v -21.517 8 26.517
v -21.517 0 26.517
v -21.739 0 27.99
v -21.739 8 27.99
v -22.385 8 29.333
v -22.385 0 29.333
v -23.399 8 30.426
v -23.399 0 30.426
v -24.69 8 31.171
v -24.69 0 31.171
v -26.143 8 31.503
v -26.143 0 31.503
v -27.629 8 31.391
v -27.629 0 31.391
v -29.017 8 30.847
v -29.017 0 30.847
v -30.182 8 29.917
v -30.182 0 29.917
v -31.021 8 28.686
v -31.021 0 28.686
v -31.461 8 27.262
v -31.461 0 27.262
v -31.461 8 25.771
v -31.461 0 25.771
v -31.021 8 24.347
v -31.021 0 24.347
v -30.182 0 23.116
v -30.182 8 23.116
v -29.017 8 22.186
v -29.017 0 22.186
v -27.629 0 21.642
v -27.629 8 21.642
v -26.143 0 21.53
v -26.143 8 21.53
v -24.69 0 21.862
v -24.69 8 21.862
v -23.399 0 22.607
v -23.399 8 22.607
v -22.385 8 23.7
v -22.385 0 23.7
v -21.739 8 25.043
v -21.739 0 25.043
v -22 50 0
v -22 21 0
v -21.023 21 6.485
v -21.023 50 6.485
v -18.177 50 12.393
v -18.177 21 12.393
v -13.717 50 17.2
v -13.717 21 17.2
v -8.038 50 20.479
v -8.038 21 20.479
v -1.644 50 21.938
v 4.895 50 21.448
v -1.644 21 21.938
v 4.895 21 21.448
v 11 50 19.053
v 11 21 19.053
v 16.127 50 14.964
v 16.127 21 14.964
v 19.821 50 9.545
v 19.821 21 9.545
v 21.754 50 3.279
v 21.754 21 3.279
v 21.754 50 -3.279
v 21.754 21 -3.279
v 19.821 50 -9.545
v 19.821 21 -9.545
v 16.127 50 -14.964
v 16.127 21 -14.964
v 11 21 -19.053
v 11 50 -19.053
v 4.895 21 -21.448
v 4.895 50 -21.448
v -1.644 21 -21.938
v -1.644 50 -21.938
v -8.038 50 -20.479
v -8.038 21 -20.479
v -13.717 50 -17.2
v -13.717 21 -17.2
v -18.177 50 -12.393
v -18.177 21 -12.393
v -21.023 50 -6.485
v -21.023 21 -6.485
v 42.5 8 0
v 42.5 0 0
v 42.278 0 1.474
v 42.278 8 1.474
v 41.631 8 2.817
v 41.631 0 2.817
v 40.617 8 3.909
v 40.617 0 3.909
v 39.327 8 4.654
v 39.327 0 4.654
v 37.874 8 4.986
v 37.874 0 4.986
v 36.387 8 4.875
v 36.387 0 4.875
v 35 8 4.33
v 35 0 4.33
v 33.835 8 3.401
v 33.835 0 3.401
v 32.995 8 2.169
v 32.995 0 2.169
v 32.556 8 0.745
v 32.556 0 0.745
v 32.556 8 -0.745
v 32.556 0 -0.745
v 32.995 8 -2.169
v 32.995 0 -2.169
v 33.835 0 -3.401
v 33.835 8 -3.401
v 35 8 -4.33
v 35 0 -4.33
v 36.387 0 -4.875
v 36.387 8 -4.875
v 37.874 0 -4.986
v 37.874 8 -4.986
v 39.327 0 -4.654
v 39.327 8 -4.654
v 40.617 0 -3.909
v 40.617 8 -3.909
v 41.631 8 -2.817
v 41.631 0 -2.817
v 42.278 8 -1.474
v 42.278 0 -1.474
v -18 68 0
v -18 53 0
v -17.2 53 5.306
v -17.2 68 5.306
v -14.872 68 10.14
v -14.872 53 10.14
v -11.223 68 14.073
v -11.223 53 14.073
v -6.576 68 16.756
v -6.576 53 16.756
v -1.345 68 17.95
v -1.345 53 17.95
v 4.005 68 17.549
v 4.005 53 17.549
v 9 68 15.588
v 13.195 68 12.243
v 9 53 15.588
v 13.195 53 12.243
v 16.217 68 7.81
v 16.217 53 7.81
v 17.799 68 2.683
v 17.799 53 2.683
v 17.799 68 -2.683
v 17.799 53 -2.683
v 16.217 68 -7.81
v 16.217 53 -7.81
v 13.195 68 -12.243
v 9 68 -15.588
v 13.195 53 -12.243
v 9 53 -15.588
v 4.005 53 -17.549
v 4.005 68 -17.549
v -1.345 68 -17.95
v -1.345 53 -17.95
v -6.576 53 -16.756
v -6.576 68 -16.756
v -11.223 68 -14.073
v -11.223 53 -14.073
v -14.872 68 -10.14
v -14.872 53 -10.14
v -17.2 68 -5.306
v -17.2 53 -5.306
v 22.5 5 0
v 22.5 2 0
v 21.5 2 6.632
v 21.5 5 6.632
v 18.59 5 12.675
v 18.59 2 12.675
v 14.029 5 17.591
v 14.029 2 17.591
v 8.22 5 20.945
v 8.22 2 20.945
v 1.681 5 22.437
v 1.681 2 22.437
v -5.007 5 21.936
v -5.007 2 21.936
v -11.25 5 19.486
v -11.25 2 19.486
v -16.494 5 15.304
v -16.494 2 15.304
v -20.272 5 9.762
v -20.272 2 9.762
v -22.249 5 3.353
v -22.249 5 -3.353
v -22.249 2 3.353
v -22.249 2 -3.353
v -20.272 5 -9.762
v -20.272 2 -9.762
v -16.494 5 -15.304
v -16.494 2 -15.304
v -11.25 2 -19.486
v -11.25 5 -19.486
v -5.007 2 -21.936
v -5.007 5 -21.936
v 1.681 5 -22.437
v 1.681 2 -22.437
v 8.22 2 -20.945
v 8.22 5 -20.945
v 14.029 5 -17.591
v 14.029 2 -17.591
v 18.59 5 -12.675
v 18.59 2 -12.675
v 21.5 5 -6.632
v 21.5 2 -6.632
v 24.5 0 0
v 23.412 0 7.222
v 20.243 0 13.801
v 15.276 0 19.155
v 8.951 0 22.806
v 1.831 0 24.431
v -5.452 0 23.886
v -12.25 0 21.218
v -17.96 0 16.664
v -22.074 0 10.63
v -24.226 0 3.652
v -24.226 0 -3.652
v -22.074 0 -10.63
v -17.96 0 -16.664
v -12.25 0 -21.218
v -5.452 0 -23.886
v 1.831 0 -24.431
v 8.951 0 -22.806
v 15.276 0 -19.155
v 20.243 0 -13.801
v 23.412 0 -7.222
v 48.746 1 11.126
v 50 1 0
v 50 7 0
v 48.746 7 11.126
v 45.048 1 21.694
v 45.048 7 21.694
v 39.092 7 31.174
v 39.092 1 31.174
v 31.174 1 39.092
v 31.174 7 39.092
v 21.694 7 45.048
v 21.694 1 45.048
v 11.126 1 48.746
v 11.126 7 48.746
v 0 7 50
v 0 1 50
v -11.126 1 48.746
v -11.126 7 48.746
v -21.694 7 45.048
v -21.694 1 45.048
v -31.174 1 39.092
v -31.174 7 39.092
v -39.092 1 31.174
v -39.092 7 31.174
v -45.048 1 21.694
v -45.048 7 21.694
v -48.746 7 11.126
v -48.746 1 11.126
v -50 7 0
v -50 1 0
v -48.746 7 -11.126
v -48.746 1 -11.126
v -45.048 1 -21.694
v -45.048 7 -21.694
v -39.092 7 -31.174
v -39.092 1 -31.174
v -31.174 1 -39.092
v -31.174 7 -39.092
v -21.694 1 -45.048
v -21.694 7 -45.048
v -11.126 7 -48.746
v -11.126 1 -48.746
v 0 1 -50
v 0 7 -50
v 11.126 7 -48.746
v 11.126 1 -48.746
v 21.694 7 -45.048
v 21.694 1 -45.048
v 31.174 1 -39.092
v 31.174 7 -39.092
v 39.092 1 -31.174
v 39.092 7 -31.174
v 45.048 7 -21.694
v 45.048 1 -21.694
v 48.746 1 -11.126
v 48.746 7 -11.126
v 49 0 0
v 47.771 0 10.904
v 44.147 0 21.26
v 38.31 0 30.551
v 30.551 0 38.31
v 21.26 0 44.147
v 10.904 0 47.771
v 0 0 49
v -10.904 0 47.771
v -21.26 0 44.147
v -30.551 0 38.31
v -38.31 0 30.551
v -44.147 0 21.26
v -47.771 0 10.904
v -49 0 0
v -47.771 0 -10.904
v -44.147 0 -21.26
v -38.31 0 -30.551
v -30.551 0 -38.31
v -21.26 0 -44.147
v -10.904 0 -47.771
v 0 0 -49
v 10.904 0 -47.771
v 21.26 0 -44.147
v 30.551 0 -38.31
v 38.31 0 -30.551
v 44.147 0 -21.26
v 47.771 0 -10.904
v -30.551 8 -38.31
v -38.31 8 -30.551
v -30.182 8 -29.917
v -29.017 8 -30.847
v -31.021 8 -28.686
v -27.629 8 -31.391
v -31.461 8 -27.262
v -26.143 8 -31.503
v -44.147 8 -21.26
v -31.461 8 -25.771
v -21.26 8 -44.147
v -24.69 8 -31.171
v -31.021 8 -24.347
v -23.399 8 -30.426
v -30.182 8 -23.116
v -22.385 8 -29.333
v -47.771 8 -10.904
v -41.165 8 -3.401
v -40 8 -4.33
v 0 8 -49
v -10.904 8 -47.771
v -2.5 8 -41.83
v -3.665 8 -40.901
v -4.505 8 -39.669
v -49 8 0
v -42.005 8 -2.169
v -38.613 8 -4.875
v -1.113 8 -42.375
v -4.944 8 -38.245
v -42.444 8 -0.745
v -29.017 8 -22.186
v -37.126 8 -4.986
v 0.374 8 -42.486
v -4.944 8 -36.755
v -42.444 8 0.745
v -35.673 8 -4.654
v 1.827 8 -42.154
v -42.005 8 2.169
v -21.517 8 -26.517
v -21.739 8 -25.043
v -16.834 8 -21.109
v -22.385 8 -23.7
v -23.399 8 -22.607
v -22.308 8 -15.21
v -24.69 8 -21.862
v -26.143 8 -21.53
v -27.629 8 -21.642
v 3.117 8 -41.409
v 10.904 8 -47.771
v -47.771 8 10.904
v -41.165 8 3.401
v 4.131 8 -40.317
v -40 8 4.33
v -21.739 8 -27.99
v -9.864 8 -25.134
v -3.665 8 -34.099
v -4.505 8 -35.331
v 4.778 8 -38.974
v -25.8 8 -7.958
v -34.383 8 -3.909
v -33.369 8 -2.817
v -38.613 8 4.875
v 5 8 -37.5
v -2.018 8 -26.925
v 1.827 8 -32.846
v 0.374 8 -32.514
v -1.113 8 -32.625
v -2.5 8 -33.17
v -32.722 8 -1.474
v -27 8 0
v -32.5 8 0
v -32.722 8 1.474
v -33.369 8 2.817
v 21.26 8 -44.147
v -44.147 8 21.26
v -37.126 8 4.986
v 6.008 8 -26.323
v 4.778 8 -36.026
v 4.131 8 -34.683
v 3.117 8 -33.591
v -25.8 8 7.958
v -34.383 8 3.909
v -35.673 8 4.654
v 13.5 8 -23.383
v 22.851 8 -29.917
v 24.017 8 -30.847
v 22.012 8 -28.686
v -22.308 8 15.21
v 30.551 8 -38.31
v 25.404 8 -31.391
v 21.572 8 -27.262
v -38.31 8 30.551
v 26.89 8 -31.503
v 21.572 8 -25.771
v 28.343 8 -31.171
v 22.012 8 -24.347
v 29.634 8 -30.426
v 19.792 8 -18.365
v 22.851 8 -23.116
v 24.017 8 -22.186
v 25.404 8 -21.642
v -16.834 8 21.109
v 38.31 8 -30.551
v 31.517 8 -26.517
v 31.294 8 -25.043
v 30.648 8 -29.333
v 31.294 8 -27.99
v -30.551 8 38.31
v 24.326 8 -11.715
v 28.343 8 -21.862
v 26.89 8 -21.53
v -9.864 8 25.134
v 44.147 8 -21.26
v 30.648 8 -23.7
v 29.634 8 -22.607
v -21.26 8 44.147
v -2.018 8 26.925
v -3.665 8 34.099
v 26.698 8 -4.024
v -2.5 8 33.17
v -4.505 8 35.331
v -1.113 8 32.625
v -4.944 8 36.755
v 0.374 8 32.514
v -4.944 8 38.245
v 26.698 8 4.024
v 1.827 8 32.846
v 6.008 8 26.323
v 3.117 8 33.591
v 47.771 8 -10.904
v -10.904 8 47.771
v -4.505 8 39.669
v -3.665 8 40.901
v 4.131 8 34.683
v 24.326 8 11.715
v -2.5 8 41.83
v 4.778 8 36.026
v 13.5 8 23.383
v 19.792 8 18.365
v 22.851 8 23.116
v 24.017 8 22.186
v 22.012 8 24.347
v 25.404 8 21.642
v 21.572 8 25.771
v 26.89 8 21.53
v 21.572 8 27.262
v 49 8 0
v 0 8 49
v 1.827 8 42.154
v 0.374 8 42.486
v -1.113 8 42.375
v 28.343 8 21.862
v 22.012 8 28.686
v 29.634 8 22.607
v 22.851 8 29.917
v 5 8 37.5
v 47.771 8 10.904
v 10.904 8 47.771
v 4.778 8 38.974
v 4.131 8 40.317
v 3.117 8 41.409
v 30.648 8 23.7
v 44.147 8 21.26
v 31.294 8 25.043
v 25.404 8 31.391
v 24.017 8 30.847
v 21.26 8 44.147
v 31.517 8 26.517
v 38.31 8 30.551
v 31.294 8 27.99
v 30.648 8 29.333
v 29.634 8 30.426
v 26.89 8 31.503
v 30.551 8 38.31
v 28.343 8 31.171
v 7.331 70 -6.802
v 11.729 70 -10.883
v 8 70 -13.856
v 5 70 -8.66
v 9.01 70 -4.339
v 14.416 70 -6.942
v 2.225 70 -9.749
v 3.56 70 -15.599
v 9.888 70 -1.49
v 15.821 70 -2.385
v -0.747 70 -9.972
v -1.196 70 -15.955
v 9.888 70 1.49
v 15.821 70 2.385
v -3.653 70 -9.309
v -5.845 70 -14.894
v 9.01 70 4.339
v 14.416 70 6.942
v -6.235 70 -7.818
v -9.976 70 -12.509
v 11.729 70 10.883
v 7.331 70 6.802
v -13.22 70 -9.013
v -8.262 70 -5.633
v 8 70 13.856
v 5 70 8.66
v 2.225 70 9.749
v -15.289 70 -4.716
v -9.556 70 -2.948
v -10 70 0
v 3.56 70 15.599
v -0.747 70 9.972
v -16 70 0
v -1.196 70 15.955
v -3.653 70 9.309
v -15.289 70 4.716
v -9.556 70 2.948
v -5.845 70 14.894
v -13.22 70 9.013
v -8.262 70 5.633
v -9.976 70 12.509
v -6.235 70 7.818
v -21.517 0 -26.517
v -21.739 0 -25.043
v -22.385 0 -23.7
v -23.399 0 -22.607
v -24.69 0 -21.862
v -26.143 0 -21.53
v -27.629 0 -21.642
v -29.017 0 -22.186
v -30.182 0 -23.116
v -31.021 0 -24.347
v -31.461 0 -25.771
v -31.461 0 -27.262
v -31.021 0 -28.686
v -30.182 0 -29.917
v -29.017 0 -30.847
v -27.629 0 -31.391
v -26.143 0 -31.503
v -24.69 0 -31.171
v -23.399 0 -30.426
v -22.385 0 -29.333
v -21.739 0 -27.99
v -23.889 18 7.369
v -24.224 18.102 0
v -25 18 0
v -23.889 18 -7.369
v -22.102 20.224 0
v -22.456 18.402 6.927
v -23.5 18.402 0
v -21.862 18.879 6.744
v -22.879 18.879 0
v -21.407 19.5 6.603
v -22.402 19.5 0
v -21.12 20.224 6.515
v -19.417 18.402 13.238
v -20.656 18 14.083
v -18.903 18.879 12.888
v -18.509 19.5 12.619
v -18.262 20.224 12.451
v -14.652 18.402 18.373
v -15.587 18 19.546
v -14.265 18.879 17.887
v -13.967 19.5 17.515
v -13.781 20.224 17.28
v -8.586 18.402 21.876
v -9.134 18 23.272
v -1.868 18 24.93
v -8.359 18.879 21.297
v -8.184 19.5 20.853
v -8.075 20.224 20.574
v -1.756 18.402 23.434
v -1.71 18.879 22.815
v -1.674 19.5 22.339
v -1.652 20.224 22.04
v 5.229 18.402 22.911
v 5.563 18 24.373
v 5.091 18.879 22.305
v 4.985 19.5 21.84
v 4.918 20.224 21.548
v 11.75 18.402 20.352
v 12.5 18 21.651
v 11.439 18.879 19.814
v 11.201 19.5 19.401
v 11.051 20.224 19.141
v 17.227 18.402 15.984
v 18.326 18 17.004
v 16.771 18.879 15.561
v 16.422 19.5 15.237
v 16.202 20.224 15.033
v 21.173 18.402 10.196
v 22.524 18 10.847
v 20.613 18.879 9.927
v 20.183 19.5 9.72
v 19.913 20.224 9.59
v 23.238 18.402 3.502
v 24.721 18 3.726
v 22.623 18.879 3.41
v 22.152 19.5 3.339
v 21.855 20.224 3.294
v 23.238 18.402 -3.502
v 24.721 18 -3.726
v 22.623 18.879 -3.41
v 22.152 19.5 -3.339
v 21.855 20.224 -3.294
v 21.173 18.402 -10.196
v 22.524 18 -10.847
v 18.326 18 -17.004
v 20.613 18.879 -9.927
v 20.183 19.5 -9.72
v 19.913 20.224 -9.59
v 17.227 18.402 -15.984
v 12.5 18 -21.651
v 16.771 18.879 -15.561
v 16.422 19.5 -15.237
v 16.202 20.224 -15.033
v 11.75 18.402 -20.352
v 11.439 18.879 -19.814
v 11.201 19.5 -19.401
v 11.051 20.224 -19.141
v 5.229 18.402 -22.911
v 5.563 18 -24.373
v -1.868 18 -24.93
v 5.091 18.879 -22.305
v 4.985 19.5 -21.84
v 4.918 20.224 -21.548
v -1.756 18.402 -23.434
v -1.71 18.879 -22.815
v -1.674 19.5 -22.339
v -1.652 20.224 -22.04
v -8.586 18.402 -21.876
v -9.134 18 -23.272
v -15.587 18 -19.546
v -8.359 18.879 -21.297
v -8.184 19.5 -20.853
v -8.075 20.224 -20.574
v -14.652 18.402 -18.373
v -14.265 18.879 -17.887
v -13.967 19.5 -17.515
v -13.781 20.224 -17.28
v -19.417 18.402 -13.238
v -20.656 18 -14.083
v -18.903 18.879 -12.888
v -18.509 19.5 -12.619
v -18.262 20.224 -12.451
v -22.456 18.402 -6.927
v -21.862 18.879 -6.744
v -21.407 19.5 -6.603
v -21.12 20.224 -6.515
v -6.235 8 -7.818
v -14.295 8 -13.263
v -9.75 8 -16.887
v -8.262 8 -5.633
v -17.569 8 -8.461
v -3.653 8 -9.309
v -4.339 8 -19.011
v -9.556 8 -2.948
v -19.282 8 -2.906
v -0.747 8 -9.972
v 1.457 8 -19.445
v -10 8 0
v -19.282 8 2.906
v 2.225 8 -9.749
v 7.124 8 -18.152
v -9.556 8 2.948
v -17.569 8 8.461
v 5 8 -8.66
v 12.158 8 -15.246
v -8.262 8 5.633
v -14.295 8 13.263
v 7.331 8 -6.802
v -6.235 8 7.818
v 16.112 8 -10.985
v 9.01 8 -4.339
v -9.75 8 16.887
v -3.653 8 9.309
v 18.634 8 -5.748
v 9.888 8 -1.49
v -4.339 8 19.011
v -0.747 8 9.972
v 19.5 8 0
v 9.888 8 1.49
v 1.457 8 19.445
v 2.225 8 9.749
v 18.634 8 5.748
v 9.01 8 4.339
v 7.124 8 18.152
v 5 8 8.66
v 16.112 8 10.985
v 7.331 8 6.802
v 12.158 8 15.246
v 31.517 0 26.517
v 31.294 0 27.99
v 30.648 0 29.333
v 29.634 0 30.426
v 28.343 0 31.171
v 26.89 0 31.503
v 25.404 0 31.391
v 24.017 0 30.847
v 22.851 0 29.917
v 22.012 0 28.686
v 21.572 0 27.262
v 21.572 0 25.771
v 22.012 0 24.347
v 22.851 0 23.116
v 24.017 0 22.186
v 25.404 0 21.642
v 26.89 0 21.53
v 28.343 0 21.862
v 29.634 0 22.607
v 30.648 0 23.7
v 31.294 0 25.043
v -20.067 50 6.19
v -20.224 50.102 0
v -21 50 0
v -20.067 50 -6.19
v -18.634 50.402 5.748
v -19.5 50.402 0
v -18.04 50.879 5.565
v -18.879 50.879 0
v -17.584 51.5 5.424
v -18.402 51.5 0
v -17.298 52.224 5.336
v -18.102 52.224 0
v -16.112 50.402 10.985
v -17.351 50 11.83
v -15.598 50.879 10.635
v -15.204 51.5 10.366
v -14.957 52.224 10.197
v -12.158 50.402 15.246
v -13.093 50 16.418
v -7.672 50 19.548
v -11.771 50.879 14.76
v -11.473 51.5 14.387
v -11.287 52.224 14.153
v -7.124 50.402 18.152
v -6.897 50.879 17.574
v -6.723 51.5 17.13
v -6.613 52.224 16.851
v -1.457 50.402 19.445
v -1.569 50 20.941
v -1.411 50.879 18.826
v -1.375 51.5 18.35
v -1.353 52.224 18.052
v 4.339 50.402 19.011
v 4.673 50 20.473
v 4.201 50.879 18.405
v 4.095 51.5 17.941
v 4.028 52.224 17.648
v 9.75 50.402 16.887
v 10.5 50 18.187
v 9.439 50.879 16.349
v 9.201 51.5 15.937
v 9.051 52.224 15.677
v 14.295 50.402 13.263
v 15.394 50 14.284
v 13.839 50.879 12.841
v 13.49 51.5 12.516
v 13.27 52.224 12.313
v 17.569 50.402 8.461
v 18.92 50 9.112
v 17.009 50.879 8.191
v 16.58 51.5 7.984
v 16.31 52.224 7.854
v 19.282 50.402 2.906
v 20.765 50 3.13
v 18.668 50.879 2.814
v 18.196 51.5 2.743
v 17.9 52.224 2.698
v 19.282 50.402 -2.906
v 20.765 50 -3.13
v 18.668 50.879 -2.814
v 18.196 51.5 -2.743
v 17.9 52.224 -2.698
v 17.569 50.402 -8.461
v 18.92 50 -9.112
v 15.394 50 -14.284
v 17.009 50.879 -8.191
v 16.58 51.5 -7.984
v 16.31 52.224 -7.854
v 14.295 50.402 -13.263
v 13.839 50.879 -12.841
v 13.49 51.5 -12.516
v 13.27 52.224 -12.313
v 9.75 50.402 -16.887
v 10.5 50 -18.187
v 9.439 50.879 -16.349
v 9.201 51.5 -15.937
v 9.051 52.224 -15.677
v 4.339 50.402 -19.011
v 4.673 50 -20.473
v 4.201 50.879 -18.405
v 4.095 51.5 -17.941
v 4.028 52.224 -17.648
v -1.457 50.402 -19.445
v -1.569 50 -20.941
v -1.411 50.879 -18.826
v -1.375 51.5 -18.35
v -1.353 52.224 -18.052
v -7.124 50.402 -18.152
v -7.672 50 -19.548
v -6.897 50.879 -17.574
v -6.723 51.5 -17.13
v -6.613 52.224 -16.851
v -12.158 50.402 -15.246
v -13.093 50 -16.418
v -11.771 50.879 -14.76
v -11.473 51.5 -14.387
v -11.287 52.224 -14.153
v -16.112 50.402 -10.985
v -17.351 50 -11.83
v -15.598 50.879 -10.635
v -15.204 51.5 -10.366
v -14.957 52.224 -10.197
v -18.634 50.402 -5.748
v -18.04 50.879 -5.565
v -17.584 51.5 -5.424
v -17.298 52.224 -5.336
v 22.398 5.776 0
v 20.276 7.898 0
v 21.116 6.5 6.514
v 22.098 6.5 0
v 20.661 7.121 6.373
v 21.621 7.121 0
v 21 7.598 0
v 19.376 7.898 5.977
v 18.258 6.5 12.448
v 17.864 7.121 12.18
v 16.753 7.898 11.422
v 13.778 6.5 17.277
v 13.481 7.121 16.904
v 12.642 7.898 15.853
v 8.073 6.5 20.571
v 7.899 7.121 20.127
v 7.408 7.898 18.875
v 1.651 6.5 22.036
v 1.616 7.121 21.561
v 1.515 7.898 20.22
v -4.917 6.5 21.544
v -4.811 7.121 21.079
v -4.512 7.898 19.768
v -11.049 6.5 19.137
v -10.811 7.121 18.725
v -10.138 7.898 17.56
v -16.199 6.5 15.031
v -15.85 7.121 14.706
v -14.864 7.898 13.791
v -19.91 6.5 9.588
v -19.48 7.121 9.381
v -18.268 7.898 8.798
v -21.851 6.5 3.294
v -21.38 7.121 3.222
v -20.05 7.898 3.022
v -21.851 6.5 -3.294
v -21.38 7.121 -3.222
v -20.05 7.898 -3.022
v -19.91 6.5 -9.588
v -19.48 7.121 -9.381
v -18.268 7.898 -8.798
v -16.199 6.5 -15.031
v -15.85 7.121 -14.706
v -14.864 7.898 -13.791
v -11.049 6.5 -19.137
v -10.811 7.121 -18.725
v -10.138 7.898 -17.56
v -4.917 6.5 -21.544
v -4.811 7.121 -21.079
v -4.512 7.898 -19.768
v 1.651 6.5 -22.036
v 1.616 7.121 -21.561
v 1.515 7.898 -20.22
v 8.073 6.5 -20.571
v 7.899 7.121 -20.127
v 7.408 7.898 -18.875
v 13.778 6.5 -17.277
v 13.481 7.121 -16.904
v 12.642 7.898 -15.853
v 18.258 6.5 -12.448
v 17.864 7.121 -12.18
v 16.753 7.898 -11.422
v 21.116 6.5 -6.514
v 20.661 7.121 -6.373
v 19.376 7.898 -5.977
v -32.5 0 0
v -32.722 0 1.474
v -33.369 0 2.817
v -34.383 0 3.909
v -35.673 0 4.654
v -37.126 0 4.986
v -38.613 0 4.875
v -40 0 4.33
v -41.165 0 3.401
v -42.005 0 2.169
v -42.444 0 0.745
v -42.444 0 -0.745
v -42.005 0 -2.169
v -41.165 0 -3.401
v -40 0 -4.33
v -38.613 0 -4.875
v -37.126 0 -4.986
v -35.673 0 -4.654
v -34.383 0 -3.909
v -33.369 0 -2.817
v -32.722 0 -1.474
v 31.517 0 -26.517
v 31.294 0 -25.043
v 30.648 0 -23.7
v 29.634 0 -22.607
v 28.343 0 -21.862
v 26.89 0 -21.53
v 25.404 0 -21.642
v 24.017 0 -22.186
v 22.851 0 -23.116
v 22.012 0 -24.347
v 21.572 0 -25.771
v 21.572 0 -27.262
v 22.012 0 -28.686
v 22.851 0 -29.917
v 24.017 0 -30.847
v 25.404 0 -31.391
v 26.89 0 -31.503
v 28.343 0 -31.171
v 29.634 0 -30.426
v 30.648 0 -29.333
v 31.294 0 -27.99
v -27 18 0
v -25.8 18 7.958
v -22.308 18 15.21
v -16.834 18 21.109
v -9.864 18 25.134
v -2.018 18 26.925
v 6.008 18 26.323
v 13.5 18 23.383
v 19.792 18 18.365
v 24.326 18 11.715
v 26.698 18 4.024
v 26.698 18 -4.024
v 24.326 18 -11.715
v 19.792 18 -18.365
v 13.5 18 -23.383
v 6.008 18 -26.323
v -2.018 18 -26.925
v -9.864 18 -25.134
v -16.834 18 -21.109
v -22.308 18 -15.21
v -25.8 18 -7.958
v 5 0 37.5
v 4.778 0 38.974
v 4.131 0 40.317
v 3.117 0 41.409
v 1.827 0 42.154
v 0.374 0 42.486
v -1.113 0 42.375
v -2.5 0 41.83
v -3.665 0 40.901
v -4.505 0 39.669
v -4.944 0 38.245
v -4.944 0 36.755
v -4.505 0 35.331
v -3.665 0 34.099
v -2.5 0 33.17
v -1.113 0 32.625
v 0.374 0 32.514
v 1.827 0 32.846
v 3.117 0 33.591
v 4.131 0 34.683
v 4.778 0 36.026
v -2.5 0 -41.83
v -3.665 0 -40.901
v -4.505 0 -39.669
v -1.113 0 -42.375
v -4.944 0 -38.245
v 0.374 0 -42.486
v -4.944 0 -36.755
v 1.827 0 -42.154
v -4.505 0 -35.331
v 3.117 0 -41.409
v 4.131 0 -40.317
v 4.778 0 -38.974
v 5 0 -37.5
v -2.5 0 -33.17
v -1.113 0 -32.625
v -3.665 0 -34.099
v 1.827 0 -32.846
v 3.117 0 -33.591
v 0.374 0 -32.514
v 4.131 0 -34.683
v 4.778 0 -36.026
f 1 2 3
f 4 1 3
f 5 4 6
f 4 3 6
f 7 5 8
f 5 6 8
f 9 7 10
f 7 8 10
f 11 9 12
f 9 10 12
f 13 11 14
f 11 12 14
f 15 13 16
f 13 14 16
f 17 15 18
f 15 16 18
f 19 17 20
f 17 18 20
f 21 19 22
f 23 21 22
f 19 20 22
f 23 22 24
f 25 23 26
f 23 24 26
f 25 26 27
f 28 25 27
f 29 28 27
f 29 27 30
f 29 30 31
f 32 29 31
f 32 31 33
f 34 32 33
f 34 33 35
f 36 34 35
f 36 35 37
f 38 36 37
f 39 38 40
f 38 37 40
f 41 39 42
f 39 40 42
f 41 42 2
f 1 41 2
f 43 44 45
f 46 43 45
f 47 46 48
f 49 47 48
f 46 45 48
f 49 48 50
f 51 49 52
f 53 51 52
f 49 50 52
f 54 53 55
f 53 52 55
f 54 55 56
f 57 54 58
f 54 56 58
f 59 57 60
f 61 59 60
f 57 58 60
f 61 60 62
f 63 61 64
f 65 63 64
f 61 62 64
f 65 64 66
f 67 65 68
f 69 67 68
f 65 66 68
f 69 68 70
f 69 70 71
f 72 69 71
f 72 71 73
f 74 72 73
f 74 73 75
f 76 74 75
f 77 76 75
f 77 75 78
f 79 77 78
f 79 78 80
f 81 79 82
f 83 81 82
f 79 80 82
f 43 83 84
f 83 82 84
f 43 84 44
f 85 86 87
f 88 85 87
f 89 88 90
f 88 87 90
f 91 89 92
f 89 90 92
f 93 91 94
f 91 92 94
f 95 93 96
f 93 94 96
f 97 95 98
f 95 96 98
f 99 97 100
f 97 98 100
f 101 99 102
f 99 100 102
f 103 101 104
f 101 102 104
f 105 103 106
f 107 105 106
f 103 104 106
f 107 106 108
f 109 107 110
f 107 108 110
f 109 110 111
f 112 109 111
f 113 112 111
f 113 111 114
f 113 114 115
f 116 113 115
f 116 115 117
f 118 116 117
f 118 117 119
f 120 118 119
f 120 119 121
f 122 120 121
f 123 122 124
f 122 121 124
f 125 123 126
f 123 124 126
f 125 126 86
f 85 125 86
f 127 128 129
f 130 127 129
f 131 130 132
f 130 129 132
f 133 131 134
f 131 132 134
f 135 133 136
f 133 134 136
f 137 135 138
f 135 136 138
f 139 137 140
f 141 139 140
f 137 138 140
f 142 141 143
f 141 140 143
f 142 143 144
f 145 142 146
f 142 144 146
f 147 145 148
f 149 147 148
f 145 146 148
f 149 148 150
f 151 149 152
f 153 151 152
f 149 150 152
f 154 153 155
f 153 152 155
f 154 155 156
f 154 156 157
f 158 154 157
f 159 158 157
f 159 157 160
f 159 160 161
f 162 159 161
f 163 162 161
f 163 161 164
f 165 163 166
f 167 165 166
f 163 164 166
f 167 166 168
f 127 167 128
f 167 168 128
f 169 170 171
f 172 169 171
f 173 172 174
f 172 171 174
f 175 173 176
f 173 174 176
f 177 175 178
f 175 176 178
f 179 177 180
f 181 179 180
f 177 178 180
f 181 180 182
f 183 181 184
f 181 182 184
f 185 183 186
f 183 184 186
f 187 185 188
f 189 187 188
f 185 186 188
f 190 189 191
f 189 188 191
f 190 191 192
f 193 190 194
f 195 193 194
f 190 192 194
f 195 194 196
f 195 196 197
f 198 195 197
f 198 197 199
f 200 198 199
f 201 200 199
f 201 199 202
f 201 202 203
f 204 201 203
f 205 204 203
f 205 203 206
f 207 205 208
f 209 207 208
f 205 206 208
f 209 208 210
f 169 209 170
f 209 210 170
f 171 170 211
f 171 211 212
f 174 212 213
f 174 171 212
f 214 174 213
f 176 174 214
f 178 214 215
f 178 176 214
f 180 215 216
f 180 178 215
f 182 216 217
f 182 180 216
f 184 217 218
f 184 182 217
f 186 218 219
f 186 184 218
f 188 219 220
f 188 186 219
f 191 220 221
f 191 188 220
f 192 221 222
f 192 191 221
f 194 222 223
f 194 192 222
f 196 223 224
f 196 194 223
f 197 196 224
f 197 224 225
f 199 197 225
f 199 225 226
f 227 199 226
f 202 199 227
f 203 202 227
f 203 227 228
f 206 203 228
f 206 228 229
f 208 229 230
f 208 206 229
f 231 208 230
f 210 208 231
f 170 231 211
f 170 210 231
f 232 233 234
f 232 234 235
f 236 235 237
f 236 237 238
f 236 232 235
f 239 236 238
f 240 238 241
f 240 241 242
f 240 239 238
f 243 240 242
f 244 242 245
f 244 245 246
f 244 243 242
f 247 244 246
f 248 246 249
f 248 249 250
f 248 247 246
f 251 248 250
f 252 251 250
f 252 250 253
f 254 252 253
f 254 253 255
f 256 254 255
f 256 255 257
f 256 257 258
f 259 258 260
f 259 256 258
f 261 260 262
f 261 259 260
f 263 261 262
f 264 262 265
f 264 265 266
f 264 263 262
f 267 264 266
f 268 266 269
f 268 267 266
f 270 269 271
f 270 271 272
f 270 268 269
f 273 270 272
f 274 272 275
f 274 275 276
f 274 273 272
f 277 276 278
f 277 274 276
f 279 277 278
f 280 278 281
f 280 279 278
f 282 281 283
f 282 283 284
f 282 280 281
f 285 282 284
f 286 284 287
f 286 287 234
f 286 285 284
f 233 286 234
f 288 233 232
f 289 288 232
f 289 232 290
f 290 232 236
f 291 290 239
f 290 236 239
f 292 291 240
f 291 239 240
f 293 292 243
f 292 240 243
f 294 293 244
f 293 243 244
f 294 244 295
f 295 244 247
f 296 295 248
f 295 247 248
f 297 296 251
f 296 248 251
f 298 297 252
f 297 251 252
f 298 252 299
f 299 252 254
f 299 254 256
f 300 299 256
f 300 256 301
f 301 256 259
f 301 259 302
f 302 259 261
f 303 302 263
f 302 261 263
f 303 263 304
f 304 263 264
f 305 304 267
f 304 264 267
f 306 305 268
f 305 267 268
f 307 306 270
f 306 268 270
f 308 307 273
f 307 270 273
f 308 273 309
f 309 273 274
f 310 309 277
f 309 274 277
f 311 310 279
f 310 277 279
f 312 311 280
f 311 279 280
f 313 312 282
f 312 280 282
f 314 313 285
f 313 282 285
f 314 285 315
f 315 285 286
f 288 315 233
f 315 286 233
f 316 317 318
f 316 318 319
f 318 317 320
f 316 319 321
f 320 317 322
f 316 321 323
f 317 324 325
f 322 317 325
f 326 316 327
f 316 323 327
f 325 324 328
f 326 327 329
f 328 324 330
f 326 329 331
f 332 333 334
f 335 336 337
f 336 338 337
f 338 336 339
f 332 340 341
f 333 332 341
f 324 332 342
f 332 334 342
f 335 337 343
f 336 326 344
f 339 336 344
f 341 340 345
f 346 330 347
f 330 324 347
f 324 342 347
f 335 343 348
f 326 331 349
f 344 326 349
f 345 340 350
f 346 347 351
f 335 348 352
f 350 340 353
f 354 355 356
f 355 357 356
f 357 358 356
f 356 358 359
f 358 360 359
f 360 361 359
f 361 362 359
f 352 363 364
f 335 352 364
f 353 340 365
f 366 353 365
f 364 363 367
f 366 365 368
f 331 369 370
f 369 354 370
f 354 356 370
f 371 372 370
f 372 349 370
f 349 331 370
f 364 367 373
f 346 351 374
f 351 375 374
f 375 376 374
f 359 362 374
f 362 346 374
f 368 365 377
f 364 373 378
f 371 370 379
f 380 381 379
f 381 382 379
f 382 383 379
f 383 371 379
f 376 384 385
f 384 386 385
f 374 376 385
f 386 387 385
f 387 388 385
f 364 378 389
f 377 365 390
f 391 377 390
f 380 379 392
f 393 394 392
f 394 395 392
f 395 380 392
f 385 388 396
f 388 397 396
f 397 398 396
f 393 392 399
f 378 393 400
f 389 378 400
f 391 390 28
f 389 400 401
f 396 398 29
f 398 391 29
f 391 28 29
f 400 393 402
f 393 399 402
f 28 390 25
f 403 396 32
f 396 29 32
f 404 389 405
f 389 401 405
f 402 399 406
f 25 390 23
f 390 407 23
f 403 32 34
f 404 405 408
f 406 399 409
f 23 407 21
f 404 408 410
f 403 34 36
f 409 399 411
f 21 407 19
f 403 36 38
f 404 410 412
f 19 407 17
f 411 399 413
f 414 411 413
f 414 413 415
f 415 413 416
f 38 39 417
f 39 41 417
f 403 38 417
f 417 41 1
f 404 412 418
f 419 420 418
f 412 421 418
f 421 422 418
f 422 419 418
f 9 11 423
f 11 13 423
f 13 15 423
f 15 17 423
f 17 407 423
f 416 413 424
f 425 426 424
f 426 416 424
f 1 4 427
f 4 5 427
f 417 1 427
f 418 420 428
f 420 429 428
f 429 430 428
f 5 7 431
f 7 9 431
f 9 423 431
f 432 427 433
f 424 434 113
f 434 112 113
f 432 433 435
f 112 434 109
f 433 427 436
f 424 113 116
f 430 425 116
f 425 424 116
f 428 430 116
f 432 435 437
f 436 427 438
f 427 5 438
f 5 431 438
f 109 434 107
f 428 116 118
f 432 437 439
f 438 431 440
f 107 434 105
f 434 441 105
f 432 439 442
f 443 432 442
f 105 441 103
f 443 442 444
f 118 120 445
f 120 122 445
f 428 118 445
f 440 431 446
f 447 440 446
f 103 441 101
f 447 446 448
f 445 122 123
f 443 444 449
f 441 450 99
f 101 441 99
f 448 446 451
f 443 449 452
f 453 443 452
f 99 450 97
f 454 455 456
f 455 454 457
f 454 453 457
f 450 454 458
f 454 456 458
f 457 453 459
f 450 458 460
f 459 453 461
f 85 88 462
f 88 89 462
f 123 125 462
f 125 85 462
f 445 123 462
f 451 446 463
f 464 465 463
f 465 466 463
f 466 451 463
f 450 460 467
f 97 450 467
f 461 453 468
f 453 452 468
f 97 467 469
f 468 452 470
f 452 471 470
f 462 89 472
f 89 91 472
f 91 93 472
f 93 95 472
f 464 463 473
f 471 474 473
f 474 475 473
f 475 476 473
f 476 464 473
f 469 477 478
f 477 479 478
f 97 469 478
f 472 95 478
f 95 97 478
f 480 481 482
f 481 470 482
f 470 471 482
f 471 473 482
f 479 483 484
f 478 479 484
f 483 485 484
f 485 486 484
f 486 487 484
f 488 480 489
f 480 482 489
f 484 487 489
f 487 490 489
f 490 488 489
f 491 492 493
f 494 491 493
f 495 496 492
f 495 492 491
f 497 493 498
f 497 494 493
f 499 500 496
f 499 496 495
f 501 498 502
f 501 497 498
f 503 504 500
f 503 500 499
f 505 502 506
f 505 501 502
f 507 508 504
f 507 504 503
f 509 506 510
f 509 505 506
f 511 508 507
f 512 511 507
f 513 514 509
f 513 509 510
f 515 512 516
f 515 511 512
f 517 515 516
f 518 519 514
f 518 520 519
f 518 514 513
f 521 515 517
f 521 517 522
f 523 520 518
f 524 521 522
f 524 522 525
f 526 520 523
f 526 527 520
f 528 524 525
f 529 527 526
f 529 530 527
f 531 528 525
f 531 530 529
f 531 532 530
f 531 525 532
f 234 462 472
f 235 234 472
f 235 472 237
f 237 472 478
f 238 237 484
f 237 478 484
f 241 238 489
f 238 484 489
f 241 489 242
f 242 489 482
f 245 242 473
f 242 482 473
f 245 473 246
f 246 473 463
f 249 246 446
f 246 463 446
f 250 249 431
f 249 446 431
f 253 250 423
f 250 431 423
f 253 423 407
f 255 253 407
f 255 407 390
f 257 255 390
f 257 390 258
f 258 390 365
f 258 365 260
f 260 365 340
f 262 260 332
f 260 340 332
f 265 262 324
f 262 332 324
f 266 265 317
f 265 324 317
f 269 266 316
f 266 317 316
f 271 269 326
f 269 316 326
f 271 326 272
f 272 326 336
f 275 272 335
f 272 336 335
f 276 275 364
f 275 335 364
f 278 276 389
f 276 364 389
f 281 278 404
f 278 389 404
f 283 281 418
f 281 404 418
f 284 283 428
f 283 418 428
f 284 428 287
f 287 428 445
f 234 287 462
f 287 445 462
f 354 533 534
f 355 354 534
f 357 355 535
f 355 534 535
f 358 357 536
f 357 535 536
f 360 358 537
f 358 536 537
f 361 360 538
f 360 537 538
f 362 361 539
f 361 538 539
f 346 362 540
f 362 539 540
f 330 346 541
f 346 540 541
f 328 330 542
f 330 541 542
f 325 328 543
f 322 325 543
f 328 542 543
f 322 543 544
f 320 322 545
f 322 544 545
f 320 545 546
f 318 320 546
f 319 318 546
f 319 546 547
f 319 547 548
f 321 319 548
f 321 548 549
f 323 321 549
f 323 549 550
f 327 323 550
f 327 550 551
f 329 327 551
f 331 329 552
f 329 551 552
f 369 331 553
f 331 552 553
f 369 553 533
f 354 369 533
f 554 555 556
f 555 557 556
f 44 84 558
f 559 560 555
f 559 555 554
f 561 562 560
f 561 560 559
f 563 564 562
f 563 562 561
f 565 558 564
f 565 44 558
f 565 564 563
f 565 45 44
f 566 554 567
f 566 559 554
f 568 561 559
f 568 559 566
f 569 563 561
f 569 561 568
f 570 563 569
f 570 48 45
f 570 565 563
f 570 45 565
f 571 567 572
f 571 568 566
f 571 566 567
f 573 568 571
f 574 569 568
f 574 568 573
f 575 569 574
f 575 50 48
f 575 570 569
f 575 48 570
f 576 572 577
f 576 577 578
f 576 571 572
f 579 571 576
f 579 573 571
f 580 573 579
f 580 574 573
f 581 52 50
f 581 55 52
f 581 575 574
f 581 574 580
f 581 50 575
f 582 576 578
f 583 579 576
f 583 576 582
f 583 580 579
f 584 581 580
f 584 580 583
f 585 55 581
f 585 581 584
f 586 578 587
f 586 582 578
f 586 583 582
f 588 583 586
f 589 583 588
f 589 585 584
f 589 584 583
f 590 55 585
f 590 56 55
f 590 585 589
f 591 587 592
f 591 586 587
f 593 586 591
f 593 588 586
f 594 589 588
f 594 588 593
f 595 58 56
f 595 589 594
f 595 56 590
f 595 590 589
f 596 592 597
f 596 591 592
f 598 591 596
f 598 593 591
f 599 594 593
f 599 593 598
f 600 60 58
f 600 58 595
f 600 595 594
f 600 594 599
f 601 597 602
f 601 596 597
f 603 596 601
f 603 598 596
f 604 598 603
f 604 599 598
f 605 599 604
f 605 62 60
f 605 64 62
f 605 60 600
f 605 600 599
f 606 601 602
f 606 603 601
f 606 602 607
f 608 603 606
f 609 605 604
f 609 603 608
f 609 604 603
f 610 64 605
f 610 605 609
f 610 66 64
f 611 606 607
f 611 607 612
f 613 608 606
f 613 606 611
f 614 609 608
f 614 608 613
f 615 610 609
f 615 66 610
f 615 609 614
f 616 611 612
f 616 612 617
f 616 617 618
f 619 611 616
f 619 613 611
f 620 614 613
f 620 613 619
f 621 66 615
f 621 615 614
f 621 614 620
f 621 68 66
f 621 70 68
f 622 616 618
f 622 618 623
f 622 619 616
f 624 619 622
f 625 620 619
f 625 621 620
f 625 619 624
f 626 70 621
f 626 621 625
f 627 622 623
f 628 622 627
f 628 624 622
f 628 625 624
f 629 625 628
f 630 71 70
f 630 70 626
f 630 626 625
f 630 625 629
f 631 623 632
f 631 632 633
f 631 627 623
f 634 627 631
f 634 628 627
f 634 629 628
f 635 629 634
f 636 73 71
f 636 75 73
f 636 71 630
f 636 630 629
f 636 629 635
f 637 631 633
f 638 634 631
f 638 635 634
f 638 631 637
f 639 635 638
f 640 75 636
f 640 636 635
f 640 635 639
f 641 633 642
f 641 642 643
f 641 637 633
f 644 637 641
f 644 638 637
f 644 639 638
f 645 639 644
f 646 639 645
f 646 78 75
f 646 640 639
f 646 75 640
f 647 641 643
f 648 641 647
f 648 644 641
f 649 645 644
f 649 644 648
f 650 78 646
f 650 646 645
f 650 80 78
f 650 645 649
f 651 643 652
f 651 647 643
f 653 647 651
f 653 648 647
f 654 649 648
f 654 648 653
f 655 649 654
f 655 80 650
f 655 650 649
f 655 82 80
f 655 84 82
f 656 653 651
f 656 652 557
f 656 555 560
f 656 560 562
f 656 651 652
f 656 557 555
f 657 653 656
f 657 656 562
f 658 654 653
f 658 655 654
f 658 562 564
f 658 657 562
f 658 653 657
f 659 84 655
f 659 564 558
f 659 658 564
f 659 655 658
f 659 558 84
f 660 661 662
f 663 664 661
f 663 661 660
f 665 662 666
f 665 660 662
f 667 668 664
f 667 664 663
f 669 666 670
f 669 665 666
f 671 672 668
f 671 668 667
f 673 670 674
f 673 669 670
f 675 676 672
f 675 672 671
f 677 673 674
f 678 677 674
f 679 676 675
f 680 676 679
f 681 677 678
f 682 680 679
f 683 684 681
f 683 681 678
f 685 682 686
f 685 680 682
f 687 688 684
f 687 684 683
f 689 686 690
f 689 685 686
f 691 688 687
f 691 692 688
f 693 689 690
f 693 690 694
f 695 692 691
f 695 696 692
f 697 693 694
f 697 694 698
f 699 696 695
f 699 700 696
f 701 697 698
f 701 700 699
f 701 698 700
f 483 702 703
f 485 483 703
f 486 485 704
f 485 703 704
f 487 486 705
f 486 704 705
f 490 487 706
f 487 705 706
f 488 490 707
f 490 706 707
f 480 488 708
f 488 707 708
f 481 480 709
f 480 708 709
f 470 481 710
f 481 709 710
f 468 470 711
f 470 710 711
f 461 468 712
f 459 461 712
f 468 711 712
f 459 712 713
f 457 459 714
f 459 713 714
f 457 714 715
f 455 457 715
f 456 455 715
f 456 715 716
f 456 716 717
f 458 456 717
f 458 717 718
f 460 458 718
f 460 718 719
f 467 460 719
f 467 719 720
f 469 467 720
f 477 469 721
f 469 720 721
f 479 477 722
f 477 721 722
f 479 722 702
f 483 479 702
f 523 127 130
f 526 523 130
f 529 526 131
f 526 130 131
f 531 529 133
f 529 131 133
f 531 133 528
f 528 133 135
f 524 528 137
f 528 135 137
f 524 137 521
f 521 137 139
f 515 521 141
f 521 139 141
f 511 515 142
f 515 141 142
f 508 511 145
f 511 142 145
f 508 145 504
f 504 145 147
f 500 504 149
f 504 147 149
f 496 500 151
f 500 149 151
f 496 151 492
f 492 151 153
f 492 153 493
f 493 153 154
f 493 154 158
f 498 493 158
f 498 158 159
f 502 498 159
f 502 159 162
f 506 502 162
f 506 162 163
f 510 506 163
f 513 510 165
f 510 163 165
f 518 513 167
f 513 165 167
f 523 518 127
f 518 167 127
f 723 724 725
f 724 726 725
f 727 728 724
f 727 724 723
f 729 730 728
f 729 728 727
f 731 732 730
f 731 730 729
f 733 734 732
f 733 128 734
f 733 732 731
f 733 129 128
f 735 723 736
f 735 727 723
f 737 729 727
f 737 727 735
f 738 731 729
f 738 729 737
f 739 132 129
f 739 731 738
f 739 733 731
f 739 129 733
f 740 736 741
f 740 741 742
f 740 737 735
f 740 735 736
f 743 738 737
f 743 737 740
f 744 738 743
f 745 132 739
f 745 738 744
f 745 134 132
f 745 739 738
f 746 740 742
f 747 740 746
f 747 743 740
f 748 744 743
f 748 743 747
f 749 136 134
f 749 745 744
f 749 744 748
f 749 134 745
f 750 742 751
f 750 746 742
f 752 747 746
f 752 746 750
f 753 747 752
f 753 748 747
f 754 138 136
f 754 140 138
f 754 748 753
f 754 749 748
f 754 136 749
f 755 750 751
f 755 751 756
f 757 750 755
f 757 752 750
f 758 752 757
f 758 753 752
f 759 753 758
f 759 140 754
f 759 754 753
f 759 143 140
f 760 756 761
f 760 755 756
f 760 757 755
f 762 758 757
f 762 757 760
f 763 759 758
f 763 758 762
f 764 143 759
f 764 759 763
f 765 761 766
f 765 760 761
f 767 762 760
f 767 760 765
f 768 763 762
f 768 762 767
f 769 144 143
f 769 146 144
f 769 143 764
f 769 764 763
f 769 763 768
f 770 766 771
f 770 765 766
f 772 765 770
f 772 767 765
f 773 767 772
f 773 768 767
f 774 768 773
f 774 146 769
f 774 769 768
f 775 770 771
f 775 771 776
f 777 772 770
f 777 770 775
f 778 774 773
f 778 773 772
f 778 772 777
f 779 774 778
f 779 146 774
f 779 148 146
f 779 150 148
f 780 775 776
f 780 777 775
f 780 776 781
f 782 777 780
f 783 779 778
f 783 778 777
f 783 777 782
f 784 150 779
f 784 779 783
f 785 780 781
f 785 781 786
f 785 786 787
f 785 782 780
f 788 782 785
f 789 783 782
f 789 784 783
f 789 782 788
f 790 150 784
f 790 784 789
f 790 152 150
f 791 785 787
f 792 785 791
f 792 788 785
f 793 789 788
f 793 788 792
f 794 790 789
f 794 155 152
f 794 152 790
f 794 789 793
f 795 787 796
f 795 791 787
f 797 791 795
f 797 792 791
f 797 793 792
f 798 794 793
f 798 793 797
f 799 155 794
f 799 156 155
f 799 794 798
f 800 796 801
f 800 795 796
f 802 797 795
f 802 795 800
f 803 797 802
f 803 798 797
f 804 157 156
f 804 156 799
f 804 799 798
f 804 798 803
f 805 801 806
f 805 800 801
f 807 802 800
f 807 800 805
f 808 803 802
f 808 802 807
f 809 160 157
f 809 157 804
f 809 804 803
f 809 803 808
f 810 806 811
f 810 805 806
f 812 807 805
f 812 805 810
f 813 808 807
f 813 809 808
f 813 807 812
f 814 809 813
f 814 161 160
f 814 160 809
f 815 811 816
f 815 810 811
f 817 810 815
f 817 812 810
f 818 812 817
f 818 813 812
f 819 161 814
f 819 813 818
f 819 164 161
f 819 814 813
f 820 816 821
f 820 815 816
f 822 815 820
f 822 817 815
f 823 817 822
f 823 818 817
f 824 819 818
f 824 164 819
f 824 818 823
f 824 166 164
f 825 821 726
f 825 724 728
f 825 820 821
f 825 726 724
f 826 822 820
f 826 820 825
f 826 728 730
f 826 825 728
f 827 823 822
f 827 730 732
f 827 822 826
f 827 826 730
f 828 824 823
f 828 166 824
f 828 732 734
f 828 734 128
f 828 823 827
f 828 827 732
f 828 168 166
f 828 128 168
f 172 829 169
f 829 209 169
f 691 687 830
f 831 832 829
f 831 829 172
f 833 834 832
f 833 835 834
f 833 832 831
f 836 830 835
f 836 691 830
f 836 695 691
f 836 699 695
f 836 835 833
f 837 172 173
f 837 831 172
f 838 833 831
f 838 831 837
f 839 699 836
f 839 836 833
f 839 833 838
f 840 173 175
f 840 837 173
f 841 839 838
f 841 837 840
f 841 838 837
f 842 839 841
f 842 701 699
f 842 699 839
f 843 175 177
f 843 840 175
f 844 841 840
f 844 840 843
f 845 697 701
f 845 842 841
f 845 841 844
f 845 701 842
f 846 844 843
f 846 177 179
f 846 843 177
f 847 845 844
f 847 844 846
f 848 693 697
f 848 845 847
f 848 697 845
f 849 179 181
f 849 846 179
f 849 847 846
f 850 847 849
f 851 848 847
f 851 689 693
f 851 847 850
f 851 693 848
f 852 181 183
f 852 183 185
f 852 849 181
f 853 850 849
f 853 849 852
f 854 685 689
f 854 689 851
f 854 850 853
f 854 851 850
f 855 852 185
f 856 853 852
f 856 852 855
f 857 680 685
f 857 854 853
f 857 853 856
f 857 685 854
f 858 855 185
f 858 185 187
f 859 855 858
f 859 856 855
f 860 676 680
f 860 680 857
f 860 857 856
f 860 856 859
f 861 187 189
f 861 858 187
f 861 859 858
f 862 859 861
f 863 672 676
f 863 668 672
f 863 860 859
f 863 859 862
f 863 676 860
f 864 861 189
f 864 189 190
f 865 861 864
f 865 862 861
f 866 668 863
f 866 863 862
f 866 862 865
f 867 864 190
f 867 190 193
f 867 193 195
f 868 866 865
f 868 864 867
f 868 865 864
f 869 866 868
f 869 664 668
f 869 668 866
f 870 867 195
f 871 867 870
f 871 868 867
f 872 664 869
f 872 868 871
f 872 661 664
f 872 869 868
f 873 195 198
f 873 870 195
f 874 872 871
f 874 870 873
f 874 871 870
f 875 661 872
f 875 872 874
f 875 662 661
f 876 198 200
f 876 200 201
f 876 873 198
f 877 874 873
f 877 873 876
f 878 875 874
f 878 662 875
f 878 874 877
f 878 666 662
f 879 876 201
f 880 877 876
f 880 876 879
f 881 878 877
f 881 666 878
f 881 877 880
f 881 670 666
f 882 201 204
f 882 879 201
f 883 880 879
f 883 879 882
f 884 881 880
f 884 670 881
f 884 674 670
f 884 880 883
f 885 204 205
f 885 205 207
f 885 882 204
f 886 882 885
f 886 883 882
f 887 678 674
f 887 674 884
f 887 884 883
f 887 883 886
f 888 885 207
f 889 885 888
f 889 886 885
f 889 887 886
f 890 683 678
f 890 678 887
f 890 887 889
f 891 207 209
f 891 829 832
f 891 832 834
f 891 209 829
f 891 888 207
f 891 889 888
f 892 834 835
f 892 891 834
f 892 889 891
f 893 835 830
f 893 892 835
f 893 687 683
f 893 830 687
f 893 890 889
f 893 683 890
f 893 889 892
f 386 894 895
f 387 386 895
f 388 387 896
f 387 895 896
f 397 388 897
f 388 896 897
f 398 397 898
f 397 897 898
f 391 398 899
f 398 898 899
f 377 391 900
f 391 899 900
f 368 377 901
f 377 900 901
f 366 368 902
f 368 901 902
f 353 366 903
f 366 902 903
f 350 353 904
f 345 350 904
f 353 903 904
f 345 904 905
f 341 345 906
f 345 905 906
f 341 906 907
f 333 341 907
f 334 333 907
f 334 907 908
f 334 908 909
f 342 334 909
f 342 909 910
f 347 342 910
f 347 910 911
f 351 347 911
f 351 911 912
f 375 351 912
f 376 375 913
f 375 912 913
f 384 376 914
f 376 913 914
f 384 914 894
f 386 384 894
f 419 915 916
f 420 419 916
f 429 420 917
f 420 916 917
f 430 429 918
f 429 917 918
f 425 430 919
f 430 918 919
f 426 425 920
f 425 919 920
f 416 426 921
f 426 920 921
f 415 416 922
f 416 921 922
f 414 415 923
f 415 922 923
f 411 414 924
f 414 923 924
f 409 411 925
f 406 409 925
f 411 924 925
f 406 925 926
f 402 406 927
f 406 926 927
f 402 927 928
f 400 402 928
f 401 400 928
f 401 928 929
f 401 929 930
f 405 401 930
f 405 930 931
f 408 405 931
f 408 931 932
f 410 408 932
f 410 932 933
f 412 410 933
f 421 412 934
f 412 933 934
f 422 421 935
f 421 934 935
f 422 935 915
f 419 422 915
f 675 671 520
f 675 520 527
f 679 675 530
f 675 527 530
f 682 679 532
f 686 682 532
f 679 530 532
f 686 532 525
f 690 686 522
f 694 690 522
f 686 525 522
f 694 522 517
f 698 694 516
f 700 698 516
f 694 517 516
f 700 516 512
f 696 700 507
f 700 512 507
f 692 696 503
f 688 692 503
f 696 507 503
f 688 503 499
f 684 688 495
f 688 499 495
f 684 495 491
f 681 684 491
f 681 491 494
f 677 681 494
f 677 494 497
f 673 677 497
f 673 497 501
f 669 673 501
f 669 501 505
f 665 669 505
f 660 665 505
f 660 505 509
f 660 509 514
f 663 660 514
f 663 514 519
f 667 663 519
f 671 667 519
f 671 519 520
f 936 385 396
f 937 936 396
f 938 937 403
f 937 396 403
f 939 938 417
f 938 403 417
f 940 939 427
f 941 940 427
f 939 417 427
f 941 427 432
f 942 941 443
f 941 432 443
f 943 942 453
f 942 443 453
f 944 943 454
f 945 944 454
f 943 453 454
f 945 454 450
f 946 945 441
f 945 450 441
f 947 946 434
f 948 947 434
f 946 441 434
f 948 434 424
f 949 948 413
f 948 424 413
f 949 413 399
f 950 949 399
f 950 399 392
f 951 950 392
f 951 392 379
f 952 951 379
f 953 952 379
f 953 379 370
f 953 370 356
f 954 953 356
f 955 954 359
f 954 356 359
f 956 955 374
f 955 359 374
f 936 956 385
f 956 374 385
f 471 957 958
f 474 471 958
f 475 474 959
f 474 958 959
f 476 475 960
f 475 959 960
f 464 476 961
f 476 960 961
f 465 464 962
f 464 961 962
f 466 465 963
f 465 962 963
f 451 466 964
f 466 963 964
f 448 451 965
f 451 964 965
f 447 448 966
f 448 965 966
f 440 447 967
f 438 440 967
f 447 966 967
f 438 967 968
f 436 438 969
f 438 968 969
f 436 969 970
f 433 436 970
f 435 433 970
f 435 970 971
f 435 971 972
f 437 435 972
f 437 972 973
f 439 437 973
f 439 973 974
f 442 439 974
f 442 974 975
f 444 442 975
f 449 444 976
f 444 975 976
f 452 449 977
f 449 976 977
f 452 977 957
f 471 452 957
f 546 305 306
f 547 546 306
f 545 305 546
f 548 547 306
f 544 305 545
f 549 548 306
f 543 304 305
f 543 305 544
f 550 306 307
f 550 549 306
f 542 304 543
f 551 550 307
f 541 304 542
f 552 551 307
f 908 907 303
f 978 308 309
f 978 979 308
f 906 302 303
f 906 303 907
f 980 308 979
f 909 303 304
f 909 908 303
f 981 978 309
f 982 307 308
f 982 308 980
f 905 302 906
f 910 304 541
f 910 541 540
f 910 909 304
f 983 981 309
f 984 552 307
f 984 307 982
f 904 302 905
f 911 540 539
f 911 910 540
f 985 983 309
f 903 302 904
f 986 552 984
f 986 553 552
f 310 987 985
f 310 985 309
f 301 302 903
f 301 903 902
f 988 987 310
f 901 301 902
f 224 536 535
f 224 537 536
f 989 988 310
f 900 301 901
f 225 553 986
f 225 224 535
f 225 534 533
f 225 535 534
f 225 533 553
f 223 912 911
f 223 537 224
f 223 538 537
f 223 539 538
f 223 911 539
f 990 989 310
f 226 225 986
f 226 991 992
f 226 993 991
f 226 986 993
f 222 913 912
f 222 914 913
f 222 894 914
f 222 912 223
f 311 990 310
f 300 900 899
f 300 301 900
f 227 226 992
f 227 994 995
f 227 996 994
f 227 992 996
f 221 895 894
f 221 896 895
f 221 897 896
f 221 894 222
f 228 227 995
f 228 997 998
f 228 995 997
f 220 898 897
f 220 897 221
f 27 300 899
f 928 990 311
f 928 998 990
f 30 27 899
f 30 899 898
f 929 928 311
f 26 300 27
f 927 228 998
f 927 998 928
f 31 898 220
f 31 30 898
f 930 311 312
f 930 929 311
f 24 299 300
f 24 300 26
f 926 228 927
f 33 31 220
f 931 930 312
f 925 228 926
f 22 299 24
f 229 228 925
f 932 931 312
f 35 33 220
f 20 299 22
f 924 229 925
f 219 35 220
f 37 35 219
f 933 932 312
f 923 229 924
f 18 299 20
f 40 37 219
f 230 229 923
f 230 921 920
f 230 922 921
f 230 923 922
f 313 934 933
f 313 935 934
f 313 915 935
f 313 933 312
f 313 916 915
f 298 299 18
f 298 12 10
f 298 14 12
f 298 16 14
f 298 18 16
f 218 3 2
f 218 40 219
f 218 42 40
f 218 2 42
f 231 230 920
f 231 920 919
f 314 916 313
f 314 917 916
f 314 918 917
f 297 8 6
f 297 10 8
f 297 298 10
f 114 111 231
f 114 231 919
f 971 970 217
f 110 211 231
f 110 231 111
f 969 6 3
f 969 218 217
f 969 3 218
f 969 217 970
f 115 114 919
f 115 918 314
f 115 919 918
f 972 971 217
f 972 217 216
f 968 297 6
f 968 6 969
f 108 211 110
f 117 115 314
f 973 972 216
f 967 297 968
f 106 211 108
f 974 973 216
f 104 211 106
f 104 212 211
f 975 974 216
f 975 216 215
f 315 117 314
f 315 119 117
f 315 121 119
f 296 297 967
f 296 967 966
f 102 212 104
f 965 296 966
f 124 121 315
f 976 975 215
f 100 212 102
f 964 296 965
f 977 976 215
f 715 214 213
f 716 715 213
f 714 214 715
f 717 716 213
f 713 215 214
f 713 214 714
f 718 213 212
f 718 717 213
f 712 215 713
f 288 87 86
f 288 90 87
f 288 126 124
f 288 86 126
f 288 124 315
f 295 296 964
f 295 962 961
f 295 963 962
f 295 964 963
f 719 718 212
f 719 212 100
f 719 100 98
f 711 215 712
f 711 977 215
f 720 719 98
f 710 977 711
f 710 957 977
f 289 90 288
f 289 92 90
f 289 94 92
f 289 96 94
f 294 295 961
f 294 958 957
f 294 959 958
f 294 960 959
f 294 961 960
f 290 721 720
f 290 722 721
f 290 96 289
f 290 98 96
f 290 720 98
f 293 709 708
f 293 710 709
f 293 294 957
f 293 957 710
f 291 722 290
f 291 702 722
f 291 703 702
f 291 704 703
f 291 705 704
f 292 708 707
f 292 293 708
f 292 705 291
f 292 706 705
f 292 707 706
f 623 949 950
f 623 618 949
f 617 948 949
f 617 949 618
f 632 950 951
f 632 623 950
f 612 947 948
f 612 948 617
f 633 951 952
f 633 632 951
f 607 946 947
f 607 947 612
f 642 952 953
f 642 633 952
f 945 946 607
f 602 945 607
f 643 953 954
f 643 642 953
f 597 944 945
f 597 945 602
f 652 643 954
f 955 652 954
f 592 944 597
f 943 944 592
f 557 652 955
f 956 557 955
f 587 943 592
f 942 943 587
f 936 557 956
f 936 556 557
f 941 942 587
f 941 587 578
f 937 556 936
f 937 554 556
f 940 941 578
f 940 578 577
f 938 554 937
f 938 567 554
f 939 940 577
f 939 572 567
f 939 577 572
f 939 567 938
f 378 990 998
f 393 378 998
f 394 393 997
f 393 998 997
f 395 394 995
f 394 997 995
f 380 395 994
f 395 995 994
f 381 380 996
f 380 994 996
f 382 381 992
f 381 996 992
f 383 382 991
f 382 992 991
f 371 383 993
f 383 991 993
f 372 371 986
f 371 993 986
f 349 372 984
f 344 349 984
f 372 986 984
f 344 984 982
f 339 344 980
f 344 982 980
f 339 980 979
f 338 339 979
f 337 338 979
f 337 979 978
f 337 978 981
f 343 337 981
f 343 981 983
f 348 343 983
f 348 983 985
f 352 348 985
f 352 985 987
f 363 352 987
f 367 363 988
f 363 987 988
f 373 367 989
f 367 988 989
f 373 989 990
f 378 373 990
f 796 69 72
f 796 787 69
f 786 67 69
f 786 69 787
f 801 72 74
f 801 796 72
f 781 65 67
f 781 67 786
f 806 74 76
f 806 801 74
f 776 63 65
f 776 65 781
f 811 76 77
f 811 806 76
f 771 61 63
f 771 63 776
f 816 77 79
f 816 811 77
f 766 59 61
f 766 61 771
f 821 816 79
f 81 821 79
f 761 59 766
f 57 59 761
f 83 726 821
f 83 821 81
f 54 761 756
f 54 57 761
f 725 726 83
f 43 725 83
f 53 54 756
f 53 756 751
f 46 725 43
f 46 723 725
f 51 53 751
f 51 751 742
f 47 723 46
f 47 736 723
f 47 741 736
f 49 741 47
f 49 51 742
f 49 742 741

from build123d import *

# Parameters (mm, degrees)
F0_R     = 50
F0_R_2   = 5
F1_DEPTH = 8
F2_R     = 27
F3_DEPTH = 10
F4_R     = 22
F5_DEPTH = 32
F6_R     = 18
F7_DEPTH = 20
F8_R     = 22.5
F9_DEPTH = 8
F11_D    = 20
F12_SIZE = 2
F13_R    = 3
F14_SIZE = 1


with BuildPart() as f1:
    # F0 (on Front) → F1 (new body)
    with BuildSketch(Plane.XZ):
        Circle(F0_R)
        with Locations((-26.5165042945, -26.5165042945)):
            Circle(F0_R_2, mode=Mode.SUBTRACT)
        with Locations((0, -37.5)):
            Circle(F0_R_2, mode=Mode.SUBTRACT)
        with Locations((26.5165042945, -26.5165042945)):
            Circle(F0_R_2, mode=Mode.SUBTRACT)
        with Locations((-37.5, 0)):
            Circle(F0_R_2, mode=Mode.SUBTRACT)
        with Locations((-26.5165042945, 26.5165042945)):
            Circle(F0_R_2, mode=Mode.SUBTRACT)
        with Locations((37.5, 0)):
            Circle(F0_R_2, mode=Mode.SUBTRACT)
        with Locations((0, 37.5)):
            Circle(F0_R_2, mode=Mode.SUBTRACT)
        with Locations((26.5165042945, 26.5165042945)):
            Circle(F0_R_2, mode=Mode.SUBTRACT)
    extrude(amount=-F1_DEPTH)

    # F2 (on face) → F3 (join)
    with BuildSketch(Plane(origin=(0, 8, 0), x_dir=(-1, 0, 0), z_dir=(0, 1, 0))):
        Circle(F2_R)
    extrude(amount=F3_DEPTH)

    # F4 (on face) → F5 (join)
    with BuildSketch(Plane(origin=(0, 18, 0), x_dir=(-1, 0, 0), z_dir=(0, 1, 0))):
        Circle(F4_R)
    extrude(amount=F5_DEPTH)

    # F6 (on face) → F7 (join)
    with BuildSketch(Plane(origin=(0, 50, 0), x_dir=(-1, 0, 0), z_dir=(0, 1, 0))):
        Circle(F6_R)
    extrude(amount=F7_DEPTH)

    # F8 (on face) → F9 (cut)
    with BuildSketch(Plane.XZ):
        Circle(F8_R)
    extrude(amount=-F9_DEPTH, mode=Mode.SUBTRACT)

    # F11 (through all)
    with Locations(Plane.XZ.offset(-8)):
        with Locations((0, 0)):
            Hole(F11_D / 2)

    # F12
    f12_edges = [f1.edges().sort_by_distance(p)[0] for p in [
        (-22.5, 0, 0),
        (18, 70, 0),
    ]]
    chamfer(f12_edges, length=F12_SIZE)

    # F13
    f13_edges = [f1.edges().sort_by_distance(p)[0] for p in [
        (-22.5, 8, 0),
        (22, 18, 0),
        (18, 50, 0),
    ]]
    fillet(f13_edges, radius=F13_R)

    # F14
    f14_edges = [f1.edges().sort_by_distance(p)[0] for p in [
        (-50, 0, 0),
        (-50, 8, 0),
    ]]
    chamfer(f14_edges, length=F14_SIZE)


solid = f1.part
